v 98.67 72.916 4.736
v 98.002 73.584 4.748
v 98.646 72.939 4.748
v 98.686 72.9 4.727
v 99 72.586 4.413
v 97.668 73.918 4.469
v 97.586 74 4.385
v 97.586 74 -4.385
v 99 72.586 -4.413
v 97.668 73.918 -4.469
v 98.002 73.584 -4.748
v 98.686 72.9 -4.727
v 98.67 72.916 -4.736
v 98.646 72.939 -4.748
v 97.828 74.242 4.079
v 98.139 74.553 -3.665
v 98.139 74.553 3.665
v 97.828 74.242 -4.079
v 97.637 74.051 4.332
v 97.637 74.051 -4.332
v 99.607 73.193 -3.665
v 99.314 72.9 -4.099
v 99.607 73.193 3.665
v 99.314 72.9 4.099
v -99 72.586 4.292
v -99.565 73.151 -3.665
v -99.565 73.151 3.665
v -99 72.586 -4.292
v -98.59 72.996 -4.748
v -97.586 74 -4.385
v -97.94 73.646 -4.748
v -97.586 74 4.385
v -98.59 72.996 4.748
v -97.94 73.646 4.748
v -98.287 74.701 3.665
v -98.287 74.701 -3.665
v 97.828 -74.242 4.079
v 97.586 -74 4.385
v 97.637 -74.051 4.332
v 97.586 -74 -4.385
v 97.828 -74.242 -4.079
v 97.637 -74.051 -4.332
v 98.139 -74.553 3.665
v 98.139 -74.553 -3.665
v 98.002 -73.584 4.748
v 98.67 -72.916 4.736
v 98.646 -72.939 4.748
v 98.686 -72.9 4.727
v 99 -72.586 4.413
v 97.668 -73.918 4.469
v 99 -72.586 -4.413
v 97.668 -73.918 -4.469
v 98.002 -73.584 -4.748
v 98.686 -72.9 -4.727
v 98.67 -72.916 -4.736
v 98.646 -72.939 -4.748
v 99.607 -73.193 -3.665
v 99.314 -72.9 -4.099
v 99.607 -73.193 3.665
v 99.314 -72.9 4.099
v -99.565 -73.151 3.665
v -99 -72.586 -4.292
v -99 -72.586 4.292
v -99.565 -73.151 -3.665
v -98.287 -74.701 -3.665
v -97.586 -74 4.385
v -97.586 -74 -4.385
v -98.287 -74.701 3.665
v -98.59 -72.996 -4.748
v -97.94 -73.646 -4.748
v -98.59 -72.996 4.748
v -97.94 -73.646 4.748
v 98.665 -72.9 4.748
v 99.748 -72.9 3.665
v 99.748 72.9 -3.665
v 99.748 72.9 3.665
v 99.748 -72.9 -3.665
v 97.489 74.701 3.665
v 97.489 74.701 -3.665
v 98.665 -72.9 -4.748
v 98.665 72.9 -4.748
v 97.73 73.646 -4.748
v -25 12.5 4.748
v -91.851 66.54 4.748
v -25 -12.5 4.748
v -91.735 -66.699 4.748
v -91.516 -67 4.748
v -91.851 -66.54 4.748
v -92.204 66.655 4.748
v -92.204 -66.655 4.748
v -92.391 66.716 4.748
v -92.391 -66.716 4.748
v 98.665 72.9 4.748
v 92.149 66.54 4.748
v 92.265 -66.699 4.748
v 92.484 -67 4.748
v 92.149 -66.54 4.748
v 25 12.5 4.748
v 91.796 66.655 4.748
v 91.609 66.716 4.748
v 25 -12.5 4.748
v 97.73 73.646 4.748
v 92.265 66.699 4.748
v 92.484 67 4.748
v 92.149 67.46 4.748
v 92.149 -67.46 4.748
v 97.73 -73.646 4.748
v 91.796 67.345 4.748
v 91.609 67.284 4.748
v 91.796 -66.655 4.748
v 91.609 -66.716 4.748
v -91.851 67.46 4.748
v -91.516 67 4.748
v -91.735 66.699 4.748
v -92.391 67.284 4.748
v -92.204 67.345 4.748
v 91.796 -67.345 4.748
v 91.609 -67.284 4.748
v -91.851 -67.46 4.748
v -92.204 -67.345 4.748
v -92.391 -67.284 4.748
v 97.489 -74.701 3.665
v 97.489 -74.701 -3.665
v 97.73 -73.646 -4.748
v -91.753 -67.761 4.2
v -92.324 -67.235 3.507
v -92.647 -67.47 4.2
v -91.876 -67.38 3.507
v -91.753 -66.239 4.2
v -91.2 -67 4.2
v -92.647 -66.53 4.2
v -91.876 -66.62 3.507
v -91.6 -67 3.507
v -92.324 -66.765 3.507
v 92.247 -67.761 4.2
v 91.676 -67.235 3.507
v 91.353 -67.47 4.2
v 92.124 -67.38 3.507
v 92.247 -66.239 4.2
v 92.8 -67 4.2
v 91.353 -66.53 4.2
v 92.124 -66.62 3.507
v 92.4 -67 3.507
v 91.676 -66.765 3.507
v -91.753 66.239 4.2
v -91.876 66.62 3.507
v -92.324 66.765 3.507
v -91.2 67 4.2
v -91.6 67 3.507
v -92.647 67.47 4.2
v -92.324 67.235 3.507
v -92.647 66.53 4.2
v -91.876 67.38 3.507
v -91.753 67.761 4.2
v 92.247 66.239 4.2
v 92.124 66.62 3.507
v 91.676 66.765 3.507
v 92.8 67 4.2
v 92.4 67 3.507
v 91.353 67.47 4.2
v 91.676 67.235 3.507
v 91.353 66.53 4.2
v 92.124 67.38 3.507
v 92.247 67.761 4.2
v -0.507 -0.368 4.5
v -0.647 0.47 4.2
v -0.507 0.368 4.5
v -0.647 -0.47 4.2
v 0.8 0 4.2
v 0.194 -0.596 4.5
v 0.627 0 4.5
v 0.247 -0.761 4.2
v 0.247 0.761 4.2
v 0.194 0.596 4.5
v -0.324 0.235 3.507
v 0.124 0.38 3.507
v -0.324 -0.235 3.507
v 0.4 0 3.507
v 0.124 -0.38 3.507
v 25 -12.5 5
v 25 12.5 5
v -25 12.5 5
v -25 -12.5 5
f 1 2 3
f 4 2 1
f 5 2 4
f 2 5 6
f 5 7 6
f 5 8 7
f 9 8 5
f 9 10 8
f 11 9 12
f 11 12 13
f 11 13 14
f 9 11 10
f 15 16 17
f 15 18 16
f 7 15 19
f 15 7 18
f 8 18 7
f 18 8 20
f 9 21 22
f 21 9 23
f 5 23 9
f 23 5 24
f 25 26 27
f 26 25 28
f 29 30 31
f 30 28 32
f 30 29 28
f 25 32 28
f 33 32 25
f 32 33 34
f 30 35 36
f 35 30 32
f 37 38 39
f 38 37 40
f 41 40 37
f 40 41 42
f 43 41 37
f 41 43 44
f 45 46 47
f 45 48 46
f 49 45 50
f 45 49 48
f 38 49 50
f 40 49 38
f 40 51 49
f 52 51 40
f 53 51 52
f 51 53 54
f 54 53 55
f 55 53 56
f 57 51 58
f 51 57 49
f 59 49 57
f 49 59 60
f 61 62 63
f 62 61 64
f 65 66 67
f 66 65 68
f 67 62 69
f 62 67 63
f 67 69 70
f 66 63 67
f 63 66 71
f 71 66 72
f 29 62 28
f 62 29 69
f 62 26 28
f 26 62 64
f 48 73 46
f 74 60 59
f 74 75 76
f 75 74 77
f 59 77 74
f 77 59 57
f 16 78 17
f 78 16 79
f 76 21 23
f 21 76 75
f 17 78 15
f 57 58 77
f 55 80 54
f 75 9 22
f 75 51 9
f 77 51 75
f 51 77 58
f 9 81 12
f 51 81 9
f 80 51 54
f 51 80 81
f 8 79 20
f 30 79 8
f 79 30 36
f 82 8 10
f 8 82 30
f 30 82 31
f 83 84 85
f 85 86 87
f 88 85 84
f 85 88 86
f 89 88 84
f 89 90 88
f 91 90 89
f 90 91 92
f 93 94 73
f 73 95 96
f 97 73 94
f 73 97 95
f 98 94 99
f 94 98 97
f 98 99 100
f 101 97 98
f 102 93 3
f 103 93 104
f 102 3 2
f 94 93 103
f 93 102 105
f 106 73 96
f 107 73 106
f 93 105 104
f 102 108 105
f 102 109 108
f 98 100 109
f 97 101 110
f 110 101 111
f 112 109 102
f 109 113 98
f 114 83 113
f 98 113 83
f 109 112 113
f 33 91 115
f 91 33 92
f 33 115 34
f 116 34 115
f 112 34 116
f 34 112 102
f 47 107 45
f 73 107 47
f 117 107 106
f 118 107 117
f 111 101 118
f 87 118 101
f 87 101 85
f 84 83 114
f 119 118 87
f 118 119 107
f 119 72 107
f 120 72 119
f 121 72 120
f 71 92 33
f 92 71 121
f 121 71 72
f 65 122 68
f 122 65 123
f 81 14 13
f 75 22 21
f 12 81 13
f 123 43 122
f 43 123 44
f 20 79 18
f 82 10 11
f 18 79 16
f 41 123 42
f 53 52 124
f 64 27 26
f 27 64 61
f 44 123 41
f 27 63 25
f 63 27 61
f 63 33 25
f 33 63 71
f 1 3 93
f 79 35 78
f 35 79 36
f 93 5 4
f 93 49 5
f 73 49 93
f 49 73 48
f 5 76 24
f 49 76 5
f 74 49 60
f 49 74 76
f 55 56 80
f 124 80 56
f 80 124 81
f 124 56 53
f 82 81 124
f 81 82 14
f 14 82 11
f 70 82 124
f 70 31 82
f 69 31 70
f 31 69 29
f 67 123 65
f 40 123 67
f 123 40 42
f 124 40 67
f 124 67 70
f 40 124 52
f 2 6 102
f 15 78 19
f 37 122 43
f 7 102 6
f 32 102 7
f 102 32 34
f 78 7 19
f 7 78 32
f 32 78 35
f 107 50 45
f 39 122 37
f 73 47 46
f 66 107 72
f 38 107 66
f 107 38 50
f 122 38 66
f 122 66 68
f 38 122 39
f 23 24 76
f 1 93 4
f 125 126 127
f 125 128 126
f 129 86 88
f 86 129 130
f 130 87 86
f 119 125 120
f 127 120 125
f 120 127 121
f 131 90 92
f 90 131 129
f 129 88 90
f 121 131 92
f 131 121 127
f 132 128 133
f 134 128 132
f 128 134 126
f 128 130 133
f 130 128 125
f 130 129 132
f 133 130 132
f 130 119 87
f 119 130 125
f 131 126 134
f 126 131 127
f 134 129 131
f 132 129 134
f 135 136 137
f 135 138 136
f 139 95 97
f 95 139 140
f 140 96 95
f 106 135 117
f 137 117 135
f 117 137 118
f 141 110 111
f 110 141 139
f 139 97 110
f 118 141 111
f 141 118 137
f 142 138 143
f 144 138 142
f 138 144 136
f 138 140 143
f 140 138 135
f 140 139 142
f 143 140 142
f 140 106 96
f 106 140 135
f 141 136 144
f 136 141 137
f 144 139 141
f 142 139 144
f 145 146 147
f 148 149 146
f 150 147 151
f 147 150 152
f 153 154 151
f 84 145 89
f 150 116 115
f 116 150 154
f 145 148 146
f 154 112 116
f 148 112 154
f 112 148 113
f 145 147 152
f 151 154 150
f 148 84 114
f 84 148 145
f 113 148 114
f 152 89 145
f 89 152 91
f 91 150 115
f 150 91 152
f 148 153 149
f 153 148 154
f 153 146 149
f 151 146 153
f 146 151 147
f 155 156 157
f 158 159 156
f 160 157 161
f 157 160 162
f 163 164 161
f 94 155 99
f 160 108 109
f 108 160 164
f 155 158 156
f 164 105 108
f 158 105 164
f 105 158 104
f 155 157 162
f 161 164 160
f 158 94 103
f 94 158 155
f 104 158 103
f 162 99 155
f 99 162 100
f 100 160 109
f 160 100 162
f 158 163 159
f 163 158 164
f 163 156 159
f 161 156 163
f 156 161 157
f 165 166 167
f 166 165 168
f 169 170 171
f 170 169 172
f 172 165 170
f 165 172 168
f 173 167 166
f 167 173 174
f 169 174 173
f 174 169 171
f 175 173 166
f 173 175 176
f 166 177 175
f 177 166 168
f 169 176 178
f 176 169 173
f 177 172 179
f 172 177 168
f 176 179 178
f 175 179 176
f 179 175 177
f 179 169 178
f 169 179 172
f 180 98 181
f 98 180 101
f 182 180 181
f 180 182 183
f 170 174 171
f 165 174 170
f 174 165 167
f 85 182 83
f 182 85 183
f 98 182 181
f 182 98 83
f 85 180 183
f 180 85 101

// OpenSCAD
// Parameters
sheet_L = 200; //[100:400:1]
sheet_W = 150; //[75:300:1]
sheet_T = 10; //[5:20:1]
edge_radius = 2; //[1:6:0.5]
corner_chamfer = 2; //[1:6:0.5]
pore_radius = 0.8; //[0.3:2:0.1]
pore_depth = 0.6; //[0.2:2:0.1]
pore_margin = 8; //[4:20:1]
pore_overlap = 0.5; //[0.2:2:0.1]
rounding_shrink = 0.2; //[0.05:1:0.05]

// Foam Sheet Body
module foam_sheet_body() {
  cube([sheet_L, sheet_W, sheet_T], center=true);
}

// Edge Rounding Sphere
module edge_rounding() {
  sphere(r=edge_radius, center=true);
}

// Surface Texture Pores
module surface_texture_pores() {
  union() {
    translate([-sheet_L/2 + pore_margin, -sheet_W/2 + pore_margin, sheet_T/2 - pore_depth/2 - pore_overlap])
      sphere(r=pore_radius, center=true);
    translate([sheet_L/2 - pore_margin, -sheet_W/2 + pore_margin, sheet_T/2 - pore_depth/2 - pore_overlap])
      sphere(r=pore_radius, center=true);
    translate([-sheet_L/2 + pore_margin, sheet_W/2 - pore_margin, sheet_T/2 - pore_depth/2 - pore_overlap])
      sphere(r=pore_radius, center=true);
    translate([sheet_L/2 - pore_margin, sheet_W/2 - pore_margin, sheet_T/2 - pore_depth/2 - pore_overlap])
      sphere(r=pore_radius, center=true);
    translate([0, 0, sheet_T/2 - pore_depth/2 - pore_overlap])
      sphere(r=pore_radius, center=true);
  }
}

// Corner Chamfers
module corner_chamfers() {
  union() {
    translate([sheet_L/2 - corner_chamfer/2, sheet_W/2 - corner_chamfer/2, 0])
      rotate([0, 0, 45])
      cube([corner_chamfer, corner_chamfer, sheet_T + 2*edge_radius], center=true);
    translate([-sheet_L/2 + corner_chamfer/2, sheet_W/2 - corner_chamfer/2, 0])
      rotate([0, 0, 45])
      cube([corner_chamfer, corner_chamfer, sheet_T + 2*edge_radius], center=true);
    translate([sheet_L/2 - corner_chamfer/2, -sheet_W/2 + corner_chamfer/2, 0])
      rotate([0, 0, 45])
      cube([corner_chamfer, corner_chamfer, sheet_T + 2*edge_radius], center=true);
    translate([-sheet_L/2 + corner_chamfer/2, -sheet_W/2 + corner_chamfer/2, 0])
      rotate([0, 0, 45])
      cube([corner_chamfer, corner_chamfer, sheet_T + 2*edge_radius], center=true);
  }
}

// Branding Emboss
module branding_emboss() {
  translate([0, 0, sheet_T/2 - (sheet_T/20)/2])
    cube([sheet_L/4, sheet_W/6, sheet_T/20], center=true);
}

// Foam Sheet with Rounding and Chamfers
module foam_sheet_with_chamfers() {
  difference() {
    minkowski() {
      scale([(sheet_L - 2*edge_radius - rounding_shrink)/sheet_L,
             (sheet_W - 2*edge_radius - rounding_shrink)/sheet_W,
             (sheet_T - 2*edge_radius - rounding_shrink)/sheet_T])
        foam_sheet_body();
      edge_rounding();
    }
    corner_chamfers();
  }
}

// Foam Sheet with Pores
module foam_sheet_with_pores() {
  difference() {
    foam_sheet_with_chamfers();
    surface_texture_pores();
  }
}

// Complete Model
module complete_model() {
  union() {
    foam_sheet_with_pores();
    branding_emboss();
  }
}

// Render the final model
complete_model();
